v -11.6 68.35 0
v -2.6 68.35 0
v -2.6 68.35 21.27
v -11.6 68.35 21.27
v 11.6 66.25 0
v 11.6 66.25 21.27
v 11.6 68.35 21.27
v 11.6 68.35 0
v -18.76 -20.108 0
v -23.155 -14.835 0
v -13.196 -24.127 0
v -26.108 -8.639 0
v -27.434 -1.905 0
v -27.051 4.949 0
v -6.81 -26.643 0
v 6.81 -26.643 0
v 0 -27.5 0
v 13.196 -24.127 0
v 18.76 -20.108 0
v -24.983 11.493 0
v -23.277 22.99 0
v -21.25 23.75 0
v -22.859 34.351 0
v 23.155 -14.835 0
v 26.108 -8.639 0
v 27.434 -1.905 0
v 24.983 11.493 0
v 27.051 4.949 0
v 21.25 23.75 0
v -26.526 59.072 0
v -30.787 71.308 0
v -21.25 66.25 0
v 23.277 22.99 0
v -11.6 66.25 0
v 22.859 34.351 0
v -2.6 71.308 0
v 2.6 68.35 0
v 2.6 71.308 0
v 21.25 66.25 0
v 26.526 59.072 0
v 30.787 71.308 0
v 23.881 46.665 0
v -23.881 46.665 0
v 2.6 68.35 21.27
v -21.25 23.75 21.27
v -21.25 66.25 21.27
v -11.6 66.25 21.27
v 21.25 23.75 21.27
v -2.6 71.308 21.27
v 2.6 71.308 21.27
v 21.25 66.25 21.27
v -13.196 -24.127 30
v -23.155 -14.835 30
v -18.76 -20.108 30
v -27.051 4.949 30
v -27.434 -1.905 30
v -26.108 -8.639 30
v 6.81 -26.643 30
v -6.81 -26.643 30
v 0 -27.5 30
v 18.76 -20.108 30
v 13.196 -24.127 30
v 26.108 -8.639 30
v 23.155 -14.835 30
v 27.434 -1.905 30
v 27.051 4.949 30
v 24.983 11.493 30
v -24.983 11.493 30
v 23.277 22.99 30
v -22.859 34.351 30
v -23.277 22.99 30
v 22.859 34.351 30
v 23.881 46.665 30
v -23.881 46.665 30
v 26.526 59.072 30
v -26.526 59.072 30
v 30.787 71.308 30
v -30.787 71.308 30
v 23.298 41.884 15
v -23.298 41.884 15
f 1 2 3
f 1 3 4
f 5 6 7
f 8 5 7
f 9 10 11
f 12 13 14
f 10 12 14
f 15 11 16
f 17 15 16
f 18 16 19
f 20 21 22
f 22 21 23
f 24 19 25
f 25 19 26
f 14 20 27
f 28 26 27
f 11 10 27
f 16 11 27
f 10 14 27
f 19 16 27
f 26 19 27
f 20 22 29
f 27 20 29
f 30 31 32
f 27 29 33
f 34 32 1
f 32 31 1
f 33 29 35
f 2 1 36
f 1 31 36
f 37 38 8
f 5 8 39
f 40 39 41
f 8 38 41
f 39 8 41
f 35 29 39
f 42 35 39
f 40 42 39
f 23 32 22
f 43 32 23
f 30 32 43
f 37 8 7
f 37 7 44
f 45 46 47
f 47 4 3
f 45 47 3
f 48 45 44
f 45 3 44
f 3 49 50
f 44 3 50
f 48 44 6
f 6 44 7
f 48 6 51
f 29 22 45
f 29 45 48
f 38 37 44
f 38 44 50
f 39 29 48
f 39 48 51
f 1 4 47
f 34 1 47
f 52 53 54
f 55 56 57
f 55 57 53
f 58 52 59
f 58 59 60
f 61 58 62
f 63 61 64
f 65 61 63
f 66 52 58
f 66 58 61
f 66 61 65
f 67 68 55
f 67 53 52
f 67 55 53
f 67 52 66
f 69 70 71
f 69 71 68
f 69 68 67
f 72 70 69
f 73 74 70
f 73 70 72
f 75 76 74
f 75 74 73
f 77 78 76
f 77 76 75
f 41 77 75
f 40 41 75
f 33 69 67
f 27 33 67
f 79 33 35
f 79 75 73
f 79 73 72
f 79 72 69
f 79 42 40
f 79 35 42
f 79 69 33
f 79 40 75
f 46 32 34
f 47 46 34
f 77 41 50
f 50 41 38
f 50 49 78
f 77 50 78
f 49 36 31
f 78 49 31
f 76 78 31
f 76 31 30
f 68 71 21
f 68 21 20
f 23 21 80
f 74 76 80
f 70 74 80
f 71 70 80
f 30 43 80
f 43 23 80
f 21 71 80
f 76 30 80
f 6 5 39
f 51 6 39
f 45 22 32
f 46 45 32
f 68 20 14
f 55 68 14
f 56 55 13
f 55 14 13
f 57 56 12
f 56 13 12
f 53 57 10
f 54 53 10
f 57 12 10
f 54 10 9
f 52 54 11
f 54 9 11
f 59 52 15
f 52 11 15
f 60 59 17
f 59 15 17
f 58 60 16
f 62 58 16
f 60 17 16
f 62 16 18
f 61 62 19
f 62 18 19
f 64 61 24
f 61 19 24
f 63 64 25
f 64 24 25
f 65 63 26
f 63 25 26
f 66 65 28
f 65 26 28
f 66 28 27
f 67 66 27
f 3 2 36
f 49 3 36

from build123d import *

# Parameters (mm, degrees)
BOSS_EXTRUDE1_DEPTH = 30
SKETCH2_W           = 42.5
SKETCH2_H           = 42.5
SKETCH2_W_2         = 5.2
SKETCH2_H_2         = 2.957646667
CUT_EXTRUDE1_DEPTH  = 21.27


with BuildPart() as part:
    # Sketch1 → Boss-Extrude1 (new body)
    with BuildSketch(Plane.XY):
        with BuildLine():
            Line((30.787284994, 71.307646667), (-30.787284994, 71.307646667))
            add(Edge.make_bspline(
                [(-30.787284994, 71.307646667), (-18.71151784, 42.368167262), (-24.982996832, 11.493470723)],
                knots=[0, 0, 0, 1, 1, 1], degree=2))
            ThreePointArc((-24.982996832, 11.493470723), (0, -27.5), (24.982996832, 11.493470723))
            add(Edge.make_bspline(
                [(30.787284994, 71.307646667), (18.71151784, 42.368167262), (24.982996832, 11.493470723)],
                knots=[0, 0, 0, 1, 1, 1], degree=2))
        make_face()
    extrude(amount=BOSS_EXTRUDE1_DEPTH)

    # Sketch2 → Cut-Extrude1 (cut)
    with BuildSketch(Plane.XY):
        with Locations((0, 45)):
            Rectangle(SKETCH2_W, SKETCH2_H)
        Polygon((-11.6, 66.25), (11.6, 66.25), (11.6, 68.35), (2.6, 68.35), (-2.6, 68.35), (-11.6, 68.35), align=None)
        with Locations((0, 69.828823333)):
            Rectangle(SKETCH2_W_2, SKETCH2_H_2)
    extrude(amount=CUT_EXTRUDE1_DEPTH, mode=Mode.SUBTRACT)


solid = part.part
